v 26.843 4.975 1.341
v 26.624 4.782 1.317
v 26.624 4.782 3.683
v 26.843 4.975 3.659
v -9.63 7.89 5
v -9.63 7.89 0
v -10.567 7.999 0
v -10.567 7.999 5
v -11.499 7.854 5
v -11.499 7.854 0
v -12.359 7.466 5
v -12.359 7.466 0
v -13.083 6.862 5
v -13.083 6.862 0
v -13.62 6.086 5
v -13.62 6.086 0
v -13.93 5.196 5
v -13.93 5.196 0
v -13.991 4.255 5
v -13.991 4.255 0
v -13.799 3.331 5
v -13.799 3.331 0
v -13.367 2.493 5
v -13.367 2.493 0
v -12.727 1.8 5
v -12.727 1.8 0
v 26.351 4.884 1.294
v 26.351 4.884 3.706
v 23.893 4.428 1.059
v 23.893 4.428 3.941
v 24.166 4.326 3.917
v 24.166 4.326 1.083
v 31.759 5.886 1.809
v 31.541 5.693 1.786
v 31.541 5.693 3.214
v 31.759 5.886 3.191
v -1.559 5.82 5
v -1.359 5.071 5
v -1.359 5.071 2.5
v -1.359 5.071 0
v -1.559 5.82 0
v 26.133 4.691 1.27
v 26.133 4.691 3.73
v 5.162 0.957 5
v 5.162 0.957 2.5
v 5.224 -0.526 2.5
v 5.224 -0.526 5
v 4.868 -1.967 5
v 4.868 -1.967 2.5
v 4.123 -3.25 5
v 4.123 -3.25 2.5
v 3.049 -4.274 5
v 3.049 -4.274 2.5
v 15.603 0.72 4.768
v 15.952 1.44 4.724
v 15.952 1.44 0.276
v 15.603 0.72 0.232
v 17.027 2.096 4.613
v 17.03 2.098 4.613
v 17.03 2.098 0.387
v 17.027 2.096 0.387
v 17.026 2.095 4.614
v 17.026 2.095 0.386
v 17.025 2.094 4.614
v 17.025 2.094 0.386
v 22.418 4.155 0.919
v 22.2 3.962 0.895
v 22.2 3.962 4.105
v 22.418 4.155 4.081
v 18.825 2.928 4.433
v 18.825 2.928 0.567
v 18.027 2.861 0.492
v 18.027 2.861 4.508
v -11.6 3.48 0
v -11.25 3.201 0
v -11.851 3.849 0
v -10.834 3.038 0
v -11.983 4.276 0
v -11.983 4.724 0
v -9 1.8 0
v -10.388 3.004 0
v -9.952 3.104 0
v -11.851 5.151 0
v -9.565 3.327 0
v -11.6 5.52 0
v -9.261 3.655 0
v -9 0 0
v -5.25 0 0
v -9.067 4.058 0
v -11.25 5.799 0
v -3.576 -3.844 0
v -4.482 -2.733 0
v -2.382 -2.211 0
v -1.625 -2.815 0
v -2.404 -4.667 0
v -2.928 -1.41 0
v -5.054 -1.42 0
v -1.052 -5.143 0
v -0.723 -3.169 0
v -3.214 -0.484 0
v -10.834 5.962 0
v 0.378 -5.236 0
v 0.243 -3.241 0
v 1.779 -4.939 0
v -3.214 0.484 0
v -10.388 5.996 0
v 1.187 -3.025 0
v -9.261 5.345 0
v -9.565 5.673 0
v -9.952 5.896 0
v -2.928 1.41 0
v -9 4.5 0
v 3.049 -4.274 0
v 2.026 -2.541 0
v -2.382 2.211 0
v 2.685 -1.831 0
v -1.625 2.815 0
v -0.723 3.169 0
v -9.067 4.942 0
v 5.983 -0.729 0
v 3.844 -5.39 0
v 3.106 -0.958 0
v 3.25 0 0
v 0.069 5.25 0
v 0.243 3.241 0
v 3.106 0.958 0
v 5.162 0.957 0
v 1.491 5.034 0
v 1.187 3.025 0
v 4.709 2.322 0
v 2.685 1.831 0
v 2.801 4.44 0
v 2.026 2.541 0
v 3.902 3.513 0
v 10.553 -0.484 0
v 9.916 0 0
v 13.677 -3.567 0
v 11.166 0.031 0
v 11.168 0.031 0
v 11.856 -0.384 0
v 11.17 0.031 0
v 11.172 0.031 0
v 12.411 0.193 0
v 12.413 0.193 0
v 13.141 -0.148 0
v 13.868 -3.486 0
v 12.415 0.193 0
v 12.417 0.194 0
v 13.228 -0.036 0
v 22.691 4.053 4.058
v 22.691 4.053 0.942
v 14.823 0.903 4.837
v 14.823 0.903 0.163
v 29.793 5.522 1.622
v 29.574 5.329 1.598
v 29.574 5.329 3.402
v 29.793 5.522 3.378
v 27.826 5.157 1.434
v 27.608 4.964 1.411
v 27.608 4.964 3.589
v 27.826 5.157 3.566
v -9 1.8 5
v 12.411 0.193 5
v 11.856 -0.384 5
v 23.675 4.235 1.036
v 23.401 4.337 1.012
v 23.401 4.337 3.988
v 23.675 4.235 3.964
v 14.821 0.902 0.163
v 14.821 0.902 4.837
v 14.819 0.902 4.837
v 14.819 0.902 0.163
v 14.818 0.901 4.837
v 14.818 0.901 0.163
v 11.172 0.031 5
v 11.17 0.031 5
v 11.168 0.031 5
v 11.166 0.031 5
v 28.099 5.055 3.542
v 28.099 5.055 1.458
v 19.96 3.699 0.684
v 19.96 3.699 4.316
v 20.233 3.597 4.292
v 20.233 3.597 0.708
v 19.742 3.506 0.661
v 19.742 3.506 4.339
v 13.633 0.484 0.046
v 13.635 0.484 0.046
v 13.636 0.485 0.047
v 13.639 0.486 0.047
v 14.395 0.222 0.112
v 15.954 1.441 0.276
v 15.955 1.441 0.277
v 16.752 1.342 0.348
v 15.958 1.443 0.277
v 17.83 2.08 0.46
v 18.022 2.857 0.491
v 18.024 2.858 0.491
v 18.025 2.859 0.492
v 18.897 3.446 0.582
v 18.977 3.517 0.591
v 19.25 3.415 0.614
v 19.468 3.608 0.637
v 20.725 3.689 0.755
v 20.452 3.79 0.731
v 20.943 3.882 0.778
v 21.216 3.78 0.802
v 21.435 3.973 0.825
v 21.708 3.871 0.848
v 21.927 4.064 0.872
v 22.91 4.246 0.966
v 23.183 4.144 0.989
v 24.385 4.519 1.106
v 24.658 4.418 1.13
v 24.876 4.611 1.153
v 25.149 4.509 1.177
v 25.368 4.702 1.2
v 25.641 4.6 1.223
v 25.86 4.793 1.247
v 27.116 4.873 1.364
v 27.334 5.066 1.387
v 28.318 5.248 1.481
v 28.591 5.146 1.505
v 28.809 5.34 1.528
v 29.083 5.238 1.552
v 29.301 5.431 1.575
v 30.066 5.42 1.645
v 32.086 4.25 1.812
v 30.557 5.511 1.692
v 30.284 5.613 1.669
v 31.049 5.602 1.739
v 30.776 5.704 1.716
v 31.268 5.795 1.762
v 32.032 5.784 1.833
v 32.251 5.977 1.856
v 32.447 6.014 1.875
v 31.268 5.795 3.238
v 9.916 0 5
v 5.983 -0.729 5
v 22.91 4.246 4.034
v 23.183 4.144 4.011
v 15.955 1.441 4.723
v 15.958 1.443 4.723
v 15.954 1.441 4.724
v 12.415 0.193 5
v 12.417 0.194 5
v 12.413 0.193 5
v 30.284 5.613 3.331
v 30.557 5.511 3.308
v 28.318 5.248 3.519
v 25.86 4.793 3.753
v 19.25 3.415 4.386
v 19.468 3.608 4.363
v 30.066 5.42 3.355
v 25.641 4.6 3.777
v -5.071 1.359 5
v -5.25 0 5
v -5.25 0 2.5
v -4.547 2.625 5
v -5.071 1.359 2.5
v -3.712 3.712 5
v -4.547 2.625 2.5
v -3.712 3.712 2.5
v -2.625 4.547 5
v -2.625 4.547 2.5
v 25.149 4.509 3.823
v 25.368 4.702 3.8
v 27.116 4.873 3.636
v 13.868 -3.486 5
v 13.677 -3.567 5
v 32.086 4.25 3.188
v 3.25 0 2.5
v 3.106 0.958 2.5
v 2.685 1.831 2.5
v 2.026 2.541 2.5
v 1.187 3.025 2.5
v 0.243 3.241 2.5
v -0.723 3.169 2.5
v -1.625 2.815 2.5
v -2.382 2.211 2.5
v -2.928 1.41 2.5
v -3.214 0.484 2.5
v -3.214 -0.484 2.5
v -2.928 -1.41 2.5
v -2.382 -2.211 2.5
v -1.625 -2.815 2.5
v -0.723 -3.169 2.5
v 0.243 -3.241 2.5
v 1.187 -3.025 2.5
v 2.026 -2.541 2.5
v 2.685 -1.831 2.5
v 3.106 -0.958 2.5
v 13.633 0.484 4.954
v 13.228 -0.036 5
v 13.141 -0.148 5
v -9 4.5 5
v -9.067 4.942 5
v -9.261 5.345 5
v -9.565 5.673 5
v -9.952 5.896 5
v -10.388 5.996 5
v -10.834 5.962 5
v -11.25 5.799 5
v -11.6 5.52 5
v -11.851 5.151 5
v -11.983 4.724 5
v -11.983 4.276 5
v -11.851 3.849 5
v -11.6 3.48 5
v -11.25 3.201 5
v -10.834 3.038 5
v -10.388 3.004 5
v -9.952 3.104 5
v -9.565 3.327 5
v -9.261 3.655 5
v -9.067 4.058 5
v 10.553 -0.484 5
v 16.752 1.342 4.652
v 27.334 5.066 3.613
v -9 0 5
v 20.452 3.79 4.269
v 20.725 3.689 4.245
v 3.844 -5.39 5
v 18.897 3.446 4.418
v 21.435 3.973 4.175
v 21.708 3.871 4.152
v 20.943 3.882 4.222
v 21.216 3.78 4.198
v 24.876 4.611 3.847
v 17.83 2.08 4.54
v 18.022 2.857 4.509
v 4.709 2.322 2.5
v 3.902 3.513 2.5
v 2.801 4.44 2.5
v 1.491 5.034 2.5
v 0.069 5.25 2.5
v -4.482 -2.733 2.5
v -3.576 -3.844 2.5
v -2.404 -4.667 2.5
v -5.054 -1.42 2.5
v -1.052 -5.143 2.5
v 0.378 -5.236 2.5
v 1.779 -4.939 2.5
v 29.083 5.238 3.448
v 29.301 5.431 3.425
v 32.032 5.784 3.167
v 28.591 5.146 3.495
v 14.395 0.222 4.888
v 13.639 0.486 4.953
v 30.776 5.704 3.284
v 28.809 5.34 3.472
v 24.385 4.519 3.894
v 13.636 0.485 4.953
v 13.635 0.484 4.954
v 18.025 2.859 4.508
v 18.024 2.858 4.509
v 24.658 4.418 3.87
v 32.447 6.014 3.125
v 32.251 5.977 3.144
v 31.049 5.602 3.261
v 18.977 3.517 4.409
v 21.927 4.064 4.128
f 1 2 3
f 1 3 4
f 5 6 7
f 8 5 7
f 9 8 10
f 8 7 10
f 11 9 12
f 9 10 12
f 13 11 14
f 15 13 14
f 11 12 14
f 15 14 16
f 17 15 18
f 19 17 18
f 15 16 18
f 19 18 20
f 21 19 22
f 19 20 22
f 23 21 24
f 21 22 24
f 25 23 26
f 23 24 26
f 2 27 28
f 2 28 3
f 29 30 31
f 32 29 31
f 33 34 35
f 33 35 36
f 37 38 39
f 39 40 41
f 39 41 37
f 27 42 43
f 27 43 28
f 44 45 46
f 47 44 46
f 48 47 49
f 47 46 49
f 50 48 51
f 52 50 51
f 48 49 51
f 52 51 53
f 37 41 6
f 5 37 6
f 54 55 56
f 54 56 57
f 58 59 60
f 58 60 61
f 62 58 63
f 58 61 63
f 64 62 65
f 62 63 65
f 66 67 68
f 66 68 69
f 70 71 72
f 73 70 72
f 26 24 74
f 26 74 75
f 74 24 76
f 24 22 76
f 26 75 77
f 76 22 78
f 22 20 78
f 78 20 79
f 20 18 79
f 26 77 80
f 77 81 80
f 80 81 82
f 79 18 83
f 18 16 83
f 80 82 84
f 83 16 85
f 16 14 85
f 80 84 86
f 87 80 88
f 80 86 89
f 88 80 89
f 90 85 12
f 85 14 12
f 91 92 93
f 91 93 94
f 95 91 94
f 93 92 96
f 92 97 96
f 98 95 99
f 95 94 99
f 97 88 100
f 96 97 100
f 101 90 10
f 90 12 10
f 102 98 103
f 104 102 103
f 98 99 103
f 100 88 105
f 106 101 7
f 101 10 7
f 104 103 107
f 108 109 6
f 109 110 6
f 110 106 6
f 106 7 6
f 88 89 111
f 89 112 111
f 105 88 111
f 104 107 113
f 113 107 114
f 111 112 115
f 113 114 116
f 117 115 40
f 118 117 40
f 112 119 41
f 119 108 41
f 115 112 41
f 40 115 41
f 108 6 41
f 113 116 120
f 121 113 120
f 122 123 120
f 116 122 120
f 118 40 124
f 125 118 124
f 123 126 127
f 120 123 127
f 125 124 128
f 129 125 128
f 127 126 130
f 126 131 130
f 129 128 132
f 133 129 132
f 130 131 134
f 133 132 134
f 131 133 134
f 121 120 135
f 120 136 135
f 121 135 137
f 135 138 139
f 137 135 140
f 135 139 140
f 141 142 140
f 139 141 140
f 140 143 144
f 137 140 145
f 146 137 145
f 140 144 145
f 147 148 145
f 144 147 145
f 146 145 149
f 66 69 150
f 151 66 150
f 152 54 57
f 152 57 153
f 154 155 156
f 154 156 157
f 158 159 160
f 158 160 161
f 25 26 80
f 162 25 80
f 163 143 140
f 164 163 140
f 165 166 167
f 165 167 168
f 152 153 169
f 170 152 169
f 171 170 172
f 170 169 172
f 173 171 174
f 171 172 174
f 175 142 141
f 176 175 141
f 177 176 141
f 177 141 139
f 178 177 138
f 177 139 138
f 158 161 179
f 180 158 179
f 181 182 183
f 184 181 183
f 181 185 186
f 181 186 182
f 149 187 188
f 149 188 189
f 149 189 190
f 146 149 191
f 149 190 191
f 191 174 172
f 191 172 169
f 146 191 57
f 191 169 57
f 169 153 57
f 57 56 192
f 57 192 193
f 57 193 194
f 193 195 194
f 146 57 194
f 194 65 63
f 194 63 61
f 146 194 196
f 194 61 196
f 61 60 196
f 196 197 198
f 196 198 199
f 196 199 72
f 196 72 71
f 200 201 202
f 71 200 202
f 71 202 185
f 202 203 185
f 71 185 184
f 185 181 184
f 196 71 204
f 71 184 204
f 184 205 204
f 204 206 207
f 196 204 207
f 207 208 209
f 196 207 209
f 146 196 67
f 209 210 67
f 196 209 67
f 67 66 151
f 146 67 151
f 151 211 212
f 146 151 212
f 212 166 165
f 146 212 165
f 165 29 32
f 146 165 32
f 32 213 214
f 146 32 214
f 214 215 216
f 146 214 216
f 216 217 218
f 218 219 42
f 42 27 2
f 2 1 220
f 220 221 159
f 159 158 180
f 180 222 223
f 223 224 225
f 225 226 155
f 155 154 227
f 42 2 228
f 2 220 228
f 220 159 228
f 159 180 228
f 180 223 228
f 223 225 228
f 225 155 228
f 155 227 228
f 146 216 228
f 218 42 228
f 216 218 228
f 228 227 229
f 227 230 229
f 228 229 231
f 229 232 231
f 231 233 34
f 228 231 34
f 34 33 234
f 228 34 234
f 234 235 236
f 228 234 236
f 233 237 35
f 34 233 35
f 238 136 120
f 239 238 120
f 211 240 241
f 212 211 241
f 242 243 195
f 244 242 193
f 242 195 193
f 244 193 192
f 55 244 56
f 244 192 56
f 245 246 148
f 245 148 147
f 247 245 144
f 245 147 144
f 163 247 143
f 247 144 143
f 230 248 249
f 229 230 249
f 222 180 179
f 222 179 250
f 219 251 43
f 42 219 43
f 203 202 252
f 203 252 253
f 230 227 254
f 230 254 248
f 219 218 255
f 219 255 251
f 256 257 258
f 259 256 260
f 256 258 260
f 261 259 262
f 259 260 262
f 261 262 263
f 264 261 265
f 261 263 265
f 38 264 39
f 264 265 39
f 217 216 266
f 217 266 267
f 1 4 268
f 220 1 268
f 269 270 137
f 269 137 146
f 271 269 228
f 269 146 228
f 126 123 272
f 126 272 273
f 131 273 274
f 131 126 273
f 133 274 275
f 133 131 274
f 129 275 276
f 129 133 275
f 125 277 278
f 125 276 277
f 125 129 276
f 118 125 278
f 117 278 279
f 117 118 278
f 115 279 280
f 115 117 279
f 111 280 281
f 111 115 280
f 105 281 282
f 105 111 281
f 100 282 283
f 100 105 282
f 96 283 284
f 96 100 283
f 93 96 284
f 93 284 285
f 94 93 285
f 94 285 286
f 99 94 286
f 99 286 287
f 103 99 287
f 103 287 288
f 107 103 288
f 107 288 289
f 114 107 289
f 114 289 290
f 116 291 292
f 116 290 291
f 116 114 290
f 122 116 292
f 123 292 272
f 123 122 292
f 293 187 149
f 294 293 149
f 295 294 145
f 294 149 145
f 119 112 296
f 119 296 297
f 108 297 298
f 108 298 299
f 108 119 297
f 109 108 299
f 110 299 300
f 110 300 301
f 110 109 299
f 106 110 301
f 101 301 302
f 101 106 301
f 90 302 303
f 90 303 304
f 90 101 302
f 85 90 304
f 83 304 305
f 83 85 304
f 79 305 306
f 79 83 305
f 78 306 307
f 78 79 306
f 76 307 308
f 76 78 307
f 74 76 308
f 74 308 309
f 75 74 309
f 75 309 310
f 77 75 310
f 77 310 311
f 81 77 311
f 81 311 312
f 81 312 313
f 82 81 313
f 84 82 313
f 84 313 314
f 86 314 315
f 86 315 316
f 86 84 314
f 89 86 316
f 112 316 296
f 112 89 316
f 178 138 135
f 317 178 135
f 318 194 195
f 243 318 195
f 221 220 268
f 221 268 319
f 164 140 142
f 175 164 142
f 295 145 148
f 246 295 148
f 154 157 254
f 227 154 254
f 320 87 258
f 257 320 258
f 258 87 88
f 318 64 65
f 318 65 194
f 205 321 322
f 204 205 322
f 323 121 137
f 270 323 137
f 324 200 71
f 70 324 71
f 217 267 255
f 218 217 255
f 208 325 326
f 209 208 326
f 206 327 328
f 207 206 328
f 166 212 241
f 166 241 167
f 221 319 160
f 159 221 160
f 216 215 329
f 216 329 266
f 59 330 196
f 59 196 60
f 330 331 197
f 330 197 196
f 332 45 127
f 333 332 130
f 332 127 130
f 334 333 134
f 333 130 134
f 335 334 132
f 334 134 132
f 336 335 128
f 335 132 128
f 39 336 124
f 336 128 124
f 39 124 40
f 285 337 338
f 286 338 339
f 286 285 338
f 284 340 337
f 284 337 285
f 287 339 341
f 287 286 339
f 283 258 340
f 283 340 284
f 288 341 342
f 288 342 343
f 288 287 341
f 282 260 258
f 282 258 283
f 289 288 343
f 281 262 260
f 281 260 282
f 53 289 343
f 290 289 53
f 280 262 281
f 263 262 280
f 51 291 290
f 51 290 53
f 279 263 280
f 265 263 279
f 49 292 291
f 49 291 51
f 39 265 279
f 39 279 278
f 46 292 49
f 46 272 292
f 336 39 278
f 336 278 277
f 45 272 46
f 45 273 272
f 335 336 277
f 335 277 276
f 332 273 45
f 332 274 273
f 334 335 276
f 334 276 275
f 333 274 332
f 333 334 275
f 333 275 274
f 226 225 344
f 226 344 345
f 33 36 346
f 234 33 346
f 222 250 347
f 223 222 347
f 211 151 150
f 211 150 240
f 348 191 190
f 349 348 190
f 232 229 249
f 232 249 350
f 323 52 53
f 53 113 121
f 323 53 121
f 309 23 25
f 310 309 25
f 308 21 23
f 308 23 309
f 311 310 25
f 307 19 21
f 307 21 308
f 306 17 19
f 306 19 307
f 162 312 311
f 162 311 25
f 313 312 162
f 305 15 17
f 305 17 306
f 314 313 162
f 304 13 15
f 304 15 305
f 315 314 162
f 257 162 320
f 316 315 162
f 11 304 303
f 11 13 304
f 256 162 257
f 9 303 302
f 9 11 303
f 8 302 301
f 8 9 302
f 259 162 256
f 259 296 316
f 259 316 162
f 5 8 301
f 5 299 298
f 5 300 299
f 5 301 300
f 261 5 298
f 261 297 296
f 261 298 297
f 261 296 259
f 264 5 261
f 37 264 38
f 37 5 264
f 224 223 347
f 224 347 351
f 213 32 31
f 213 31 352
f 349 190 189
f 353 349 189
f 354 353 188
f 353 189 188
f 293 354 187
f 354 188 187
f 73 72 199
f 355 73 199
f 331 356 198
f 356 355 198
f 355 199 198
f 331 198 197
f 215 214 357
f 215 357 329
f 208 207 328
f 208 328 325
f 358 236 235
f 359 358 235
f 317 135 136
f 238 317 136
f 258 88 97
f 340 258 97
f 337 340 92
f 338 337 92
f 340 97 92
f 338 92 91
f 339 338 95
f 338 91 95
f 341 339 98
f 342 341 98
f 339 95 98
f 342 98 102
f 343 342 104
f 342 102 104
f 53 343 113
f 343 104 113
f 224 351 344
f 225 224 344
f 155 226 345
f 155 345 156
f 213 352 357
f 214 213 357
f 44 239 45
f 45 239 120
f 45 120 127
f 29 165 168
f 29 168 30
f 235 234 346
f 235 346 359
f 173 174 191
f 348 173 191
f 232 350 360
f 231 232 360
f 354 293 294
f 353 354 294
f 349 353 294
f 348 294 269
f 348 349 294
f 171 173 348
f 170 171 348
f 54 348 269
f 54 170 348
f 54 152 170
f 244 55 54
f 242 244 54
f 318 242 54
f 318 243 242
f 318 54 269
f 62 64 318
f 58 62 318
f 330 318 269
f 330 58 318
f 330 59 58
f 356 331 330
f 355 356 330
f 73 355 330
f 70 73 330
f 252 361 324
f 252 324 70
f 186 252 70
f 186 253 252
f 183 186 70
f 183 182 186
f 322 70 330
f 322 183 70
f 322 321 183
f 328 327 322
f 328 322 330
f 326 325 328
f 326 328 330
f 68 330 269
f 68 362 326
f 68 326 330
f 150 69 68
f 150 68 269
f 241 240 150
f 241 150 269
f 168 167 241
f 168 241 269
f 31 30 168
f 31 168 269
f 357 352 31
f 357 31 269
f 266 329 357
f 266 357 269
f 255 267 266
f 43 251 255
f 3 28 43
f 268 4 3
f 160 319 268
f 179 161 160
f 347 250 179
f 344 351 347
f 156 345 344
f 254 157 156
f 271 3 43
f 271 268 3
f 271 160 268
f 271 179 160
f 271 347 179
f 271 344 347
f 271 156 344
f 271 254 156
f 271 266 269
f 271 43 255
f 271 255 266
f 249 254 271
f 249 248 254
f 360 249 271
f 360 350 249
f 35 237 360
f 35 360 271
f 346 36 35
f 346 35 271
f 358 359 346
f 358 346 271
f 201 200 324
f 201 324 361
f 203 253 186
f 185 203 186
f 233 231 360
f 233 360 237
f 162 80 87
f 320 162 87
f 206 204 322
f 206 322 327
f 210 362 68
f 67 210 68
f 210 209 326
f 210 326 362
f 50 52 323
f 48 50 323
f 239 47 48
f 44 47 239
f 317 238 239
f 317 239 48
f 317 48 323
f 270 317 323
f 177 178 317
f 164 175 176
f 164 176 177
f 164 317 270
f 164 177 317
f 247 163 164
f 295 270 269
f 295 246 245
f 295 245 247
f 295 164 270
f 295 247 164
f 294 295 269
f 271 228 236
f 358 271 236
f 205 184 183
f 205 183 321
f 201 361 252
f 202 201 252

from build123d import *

# Parameters (mm, degrees)
SKETCH1_R               = 1.5
BOSS_EXTRUDE1_DEPTH     = 5
BOSS_EXTRUDE1_2_DEPTH   = 5
SKETCH1_3_R             = 5.25
BOSS_EXTRUDE2_DEPTH     = 2.5
CUT_EXTRUDE4_DEPTH      = 34.791042337
CUT_EXTRUDE4_DEPTH_BACK = 34.791042337
SKETCH1_5_R             = 3.25
CUT_EXTRUDE1_DEPTH      = 34.791042337
CUT_EXTRUDE2_DEPTH      = 34.791042337
LPATTERN1_COUNT         = 28
LPATTERN1_PITCH         = 0.5
CUT_EXTRUDE3_DEPTH      = 34.791042337
CIRPATTERN1_COUNT       = 8
CIRPATTERN1_ANGLE       = 42


with BuildPart() as part:
    # Sketch1 → Boss-Extrude1 (new body)
    with BuildSketch(Plane.XY):
        with BuildLine():
            Line((-1.559459186, 5.819980914), (-9.630372069, 7.89024295))
            ThreePointArc((-9.630372069, 7.89024295), (-13.619847961, 6.086363356), (-12.727105745, 1.8))
            Line((-12.727105745, 1.8), (-9, 1.8))
            Line((-9, 1.8), (-9, 0))
            Line((-9, 0), (-5.25, 0))
            ThreePointArc((-5.25, 0), (-4.165105037, 3.195997502), (-1.358799987, 5.071110588))
            Line((-1.358799987, 5.071110588), (-1.559459186, 5.819980914))
        make_face()
        with Locations((-10.5, 4.5)):
            Circle(SKETCH1_R, mode=Mode.SUBTRACT)
    extrude(amount=BOSS_EXTRUDE1_DEPTH)



with BuildPart() as body_2:
    # Sketch1 → Boss-Extrude1 2 (new body)
    with BuildSketch(Plane.XY):
        with BuildLine():
            Line((5.983025461, -0.728942102), (5.162088265, 0.956736509))
            ThreePointArc((5.162088265, 0.956736509), (4.867715236, -1.966684615), (3.048690517, -4.274106471))
            Line((3.048690517, -4.274106471), (3.844408913, -5.389662519))
            Line((3.844408913, -5.389662519), (13.676957988, -3.567307264))
            Line((13.676957988, -3.567307264), (32.08570782, 4.250488438))
            Line((32.08570782, 4.250488438), (32.44741195, 6.013772341))
            Line((32.44741195, 6.013772341), (18.681843244, 3.462474984))
            ThreePointArc((18.681843244, 3.462474984), (14.653100202, 0.834635979), (9.916045092, 0))
            Line((9.916045092, 0), (5.983025461, -0.728942102))
        make_face()
    extrude(amount=BOSS_EXTRUDE1_2_DEPTH)


with BuildPart() as part_1:
    add(part.part)

    add(body_2.part)  # Boss-Extrude2 merges body 2
    # Sketch1<3> → Boss-Extrude2 (add)
    with BuildSketch(Plane.XY):
        Circle(SKETCH1_3_R)
    extrude(amount=BOSS_EXTRUDE2_DEPTH)

    # Sketch1<5> → Cut-Extrude4 (cut, two sides: drawn at the far end of the back side and taken through both)
    with BuildSketch(Plane.XY.offset(-CUT_EXTRUDE4_DEPTH_BACK)):
        Circle(SKETCH1_5_R)
    extrude(amount=CUT_EXTRUDE4_DEPTH + CUT_EXTRUDE4_DEPTH_BACK, mode=Mode.SUBTRACT)

    # Sketch2 → Cut-Extrude1 (cut, through all)
    with BuildSketch(Plane(origin=(0, 0, 0), x_dir=(0.9832549075639557, 0.18223552549214142, 0), z_dir=(-0.18223552549214142, 0.9832549075639557, 0))):
        Polygon((13, 0), (33, -1.875), (33, 0), align=None)
        Polygon((33, -3.125), (33, -5), (13, -5), align=None)
    extrude(amount=-CUT_EXTRUDE1_DEPTH, mode=Mode.SUBTRACT)

    # Sketch3 → Cut-Extrude2 (cut, symmetric)
    with BuildSketch(Plane.XY):
        Polygon((31.759133514, 5.886207473), (32.03228257, 5.784278119), (32.250760968, 5.977325236), align=None)
    cut_extrude2 = extrude(amount=CUT_EXTRUDE2_DEPTH, both=True, mode=Mode.SUBTRACT)

    # LPattern1: Cut-Extrude2 ×28
    with Locations(*[Vector(-0.983254907563956, -0.1822355254921403, 0) * (i * LPATTERN1_PITCH) for i in range(1, LPATTERN1_COUNT)]):
        add(cut_extrude2, mode=Mode.SUBTRACT)

    # Sketch4 → Cut-Extrude3 (cut, through all)
    with BuildSketch(Plane.XY):
        Polygon((9.916045092, 0), (11.165663009, 0.030904073), (10.553215679, -0.48439513), align=None)
    cut_extrude3 = extrude(amount=CUT_EXTRUDE3_DEPTH, mode=Mode.SUBTRACT)

    # CirPattern1: Cut-Extrude3 ×8 about axis
    cirpattern1_axis = Axis((10.244577616, 11.995501923, 0), (0, 0, 1))
    for i in range(1, CIRPATTERN1_COUNT):
        add(cut_extrude3.rotate(cirpattern1_axis, i * CIRPATTERN1_ANGLE / (CIRPATTERN1_COUNT - 1)), mode=Mode.SUBTRACT)


solid = part_1.part
